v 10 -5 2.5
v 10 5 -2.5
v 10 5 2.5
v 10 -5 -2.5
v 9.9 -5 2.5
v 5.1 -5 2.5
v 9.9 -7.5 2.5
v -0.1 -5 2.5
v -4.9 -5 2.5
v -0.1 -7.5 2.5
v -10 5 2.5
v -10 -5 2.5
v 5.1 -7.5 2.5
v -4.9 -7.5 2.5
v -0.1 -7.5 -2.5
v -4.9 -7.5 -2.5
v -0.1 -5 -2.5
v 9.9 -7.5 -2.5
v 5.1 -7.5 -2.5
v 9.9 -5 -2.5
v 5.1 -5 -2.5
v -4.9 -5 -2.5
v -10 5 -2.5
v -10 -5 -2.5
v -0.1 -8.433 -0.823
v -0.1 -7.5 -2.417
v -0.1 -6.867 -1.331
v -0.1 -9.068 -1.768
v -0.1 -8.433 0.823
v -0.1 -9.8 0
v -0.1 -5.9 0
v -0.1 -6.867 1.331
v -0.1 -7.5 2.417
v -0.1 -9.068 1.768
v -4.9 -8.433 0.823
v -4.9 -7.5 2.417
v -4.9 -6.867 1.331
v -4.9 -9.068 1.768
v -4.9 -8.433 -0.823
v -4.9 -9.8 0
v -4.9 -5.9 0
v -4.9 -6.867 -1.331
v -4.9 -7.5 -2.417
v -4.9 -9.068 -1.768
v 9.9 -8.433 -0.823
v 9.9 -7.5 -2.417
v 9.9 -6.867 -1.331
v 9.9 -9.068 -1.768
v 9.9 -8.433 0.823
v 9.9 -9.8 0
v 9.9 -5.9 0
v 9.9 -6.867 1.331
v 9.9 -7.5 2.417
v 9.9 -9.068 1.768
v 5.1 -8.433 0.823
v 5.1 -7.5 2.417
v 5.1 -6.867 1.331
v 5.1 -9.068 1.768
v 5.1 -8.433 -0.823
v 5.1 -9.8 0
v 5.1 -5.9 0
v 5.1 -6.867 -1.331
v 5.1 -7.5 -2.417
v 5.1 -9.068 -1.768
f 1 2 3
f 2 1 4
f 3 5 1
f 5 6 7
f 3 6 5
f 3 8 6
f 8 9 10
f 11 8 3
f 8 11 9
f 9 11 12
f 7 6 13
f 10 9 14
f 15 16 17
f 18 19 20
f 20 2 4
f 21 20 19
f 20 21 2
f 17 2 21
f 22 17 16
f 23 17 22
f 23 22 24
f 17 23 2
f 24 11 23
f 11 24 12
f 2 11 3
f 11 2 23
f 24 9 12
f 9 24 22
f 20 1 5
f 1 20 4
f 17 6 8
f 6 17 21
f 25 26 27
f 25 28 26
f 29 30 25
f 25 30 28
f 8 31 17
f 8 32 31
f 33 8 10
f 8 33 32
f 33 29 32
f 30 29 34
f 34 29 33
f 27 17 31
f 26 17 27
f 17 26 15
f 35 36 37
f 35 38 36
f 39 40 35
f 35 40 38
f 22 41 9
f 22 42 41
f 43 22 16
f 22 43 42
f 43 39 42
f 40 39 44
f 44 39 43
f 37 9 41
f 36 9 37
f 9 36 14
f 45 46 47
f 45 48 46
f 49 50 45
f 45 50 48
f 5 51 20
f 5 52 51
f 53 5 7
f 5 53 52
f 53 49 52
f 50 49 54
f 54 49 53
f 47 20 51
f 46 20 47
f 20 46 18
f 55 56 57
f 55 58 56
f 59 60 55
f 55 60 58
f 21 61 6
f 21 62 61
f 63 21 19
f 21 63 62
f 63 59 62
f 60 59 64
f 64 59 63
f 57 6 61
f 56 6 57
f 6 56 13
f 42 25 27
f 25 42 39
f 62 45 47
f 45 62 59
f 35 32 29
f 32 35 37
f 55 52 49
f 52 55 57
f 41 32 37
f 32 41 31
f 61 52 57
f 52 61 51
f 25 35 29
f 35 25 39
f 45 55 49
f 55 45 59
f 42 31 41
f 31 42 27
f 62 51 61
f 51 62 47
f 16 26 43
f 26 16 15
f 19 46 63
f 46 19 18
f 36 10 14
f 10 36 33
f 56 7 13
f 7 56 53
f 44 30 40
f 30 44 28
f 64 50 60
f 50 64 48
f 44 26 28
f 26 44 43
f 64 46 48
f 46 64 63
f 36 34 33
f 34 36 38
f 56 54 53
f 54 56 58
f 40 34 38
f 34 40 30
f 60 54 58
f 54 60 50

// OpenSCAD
// cd /Users/d/Desktop/3dprint/ImplicitCad/
// ~/.cabal/bin/extopenscad dente2.escad

// programando com a gabi depois do bueno. primeiro dia de impressora 3d.

$res=0.15;

intersection() {
	difference (r=1) {
		union(){
			cube(size = [20, 10, 5], center = true);
			translate([-2.5, -2.5, 0])
			cube(size = [4.8, 15, 5], center = true);
			translate([7.5, -2.5, 0])
			cube(size = [4.8, 15, 5], center = true);
		}
		translate([0, -7.3, 0])
		rotate(a=90, v = [1.0,0.0,0.0])
		rotate(a=90, v = [0.0,1.0,0.0])
		cylinder(r=1.4, h=25, center = true);

	}

	union() {
		cube(size = [20, 15, 5], center = true);
		translate([0, -7.3, 0])
		rotate(a=90, v = [1.0,0.0,0.0])
		rotate(a=90, v = [0.0,1.0,0.0])
		cylinder(r=2.5, h=25, center = true);
	}

}
